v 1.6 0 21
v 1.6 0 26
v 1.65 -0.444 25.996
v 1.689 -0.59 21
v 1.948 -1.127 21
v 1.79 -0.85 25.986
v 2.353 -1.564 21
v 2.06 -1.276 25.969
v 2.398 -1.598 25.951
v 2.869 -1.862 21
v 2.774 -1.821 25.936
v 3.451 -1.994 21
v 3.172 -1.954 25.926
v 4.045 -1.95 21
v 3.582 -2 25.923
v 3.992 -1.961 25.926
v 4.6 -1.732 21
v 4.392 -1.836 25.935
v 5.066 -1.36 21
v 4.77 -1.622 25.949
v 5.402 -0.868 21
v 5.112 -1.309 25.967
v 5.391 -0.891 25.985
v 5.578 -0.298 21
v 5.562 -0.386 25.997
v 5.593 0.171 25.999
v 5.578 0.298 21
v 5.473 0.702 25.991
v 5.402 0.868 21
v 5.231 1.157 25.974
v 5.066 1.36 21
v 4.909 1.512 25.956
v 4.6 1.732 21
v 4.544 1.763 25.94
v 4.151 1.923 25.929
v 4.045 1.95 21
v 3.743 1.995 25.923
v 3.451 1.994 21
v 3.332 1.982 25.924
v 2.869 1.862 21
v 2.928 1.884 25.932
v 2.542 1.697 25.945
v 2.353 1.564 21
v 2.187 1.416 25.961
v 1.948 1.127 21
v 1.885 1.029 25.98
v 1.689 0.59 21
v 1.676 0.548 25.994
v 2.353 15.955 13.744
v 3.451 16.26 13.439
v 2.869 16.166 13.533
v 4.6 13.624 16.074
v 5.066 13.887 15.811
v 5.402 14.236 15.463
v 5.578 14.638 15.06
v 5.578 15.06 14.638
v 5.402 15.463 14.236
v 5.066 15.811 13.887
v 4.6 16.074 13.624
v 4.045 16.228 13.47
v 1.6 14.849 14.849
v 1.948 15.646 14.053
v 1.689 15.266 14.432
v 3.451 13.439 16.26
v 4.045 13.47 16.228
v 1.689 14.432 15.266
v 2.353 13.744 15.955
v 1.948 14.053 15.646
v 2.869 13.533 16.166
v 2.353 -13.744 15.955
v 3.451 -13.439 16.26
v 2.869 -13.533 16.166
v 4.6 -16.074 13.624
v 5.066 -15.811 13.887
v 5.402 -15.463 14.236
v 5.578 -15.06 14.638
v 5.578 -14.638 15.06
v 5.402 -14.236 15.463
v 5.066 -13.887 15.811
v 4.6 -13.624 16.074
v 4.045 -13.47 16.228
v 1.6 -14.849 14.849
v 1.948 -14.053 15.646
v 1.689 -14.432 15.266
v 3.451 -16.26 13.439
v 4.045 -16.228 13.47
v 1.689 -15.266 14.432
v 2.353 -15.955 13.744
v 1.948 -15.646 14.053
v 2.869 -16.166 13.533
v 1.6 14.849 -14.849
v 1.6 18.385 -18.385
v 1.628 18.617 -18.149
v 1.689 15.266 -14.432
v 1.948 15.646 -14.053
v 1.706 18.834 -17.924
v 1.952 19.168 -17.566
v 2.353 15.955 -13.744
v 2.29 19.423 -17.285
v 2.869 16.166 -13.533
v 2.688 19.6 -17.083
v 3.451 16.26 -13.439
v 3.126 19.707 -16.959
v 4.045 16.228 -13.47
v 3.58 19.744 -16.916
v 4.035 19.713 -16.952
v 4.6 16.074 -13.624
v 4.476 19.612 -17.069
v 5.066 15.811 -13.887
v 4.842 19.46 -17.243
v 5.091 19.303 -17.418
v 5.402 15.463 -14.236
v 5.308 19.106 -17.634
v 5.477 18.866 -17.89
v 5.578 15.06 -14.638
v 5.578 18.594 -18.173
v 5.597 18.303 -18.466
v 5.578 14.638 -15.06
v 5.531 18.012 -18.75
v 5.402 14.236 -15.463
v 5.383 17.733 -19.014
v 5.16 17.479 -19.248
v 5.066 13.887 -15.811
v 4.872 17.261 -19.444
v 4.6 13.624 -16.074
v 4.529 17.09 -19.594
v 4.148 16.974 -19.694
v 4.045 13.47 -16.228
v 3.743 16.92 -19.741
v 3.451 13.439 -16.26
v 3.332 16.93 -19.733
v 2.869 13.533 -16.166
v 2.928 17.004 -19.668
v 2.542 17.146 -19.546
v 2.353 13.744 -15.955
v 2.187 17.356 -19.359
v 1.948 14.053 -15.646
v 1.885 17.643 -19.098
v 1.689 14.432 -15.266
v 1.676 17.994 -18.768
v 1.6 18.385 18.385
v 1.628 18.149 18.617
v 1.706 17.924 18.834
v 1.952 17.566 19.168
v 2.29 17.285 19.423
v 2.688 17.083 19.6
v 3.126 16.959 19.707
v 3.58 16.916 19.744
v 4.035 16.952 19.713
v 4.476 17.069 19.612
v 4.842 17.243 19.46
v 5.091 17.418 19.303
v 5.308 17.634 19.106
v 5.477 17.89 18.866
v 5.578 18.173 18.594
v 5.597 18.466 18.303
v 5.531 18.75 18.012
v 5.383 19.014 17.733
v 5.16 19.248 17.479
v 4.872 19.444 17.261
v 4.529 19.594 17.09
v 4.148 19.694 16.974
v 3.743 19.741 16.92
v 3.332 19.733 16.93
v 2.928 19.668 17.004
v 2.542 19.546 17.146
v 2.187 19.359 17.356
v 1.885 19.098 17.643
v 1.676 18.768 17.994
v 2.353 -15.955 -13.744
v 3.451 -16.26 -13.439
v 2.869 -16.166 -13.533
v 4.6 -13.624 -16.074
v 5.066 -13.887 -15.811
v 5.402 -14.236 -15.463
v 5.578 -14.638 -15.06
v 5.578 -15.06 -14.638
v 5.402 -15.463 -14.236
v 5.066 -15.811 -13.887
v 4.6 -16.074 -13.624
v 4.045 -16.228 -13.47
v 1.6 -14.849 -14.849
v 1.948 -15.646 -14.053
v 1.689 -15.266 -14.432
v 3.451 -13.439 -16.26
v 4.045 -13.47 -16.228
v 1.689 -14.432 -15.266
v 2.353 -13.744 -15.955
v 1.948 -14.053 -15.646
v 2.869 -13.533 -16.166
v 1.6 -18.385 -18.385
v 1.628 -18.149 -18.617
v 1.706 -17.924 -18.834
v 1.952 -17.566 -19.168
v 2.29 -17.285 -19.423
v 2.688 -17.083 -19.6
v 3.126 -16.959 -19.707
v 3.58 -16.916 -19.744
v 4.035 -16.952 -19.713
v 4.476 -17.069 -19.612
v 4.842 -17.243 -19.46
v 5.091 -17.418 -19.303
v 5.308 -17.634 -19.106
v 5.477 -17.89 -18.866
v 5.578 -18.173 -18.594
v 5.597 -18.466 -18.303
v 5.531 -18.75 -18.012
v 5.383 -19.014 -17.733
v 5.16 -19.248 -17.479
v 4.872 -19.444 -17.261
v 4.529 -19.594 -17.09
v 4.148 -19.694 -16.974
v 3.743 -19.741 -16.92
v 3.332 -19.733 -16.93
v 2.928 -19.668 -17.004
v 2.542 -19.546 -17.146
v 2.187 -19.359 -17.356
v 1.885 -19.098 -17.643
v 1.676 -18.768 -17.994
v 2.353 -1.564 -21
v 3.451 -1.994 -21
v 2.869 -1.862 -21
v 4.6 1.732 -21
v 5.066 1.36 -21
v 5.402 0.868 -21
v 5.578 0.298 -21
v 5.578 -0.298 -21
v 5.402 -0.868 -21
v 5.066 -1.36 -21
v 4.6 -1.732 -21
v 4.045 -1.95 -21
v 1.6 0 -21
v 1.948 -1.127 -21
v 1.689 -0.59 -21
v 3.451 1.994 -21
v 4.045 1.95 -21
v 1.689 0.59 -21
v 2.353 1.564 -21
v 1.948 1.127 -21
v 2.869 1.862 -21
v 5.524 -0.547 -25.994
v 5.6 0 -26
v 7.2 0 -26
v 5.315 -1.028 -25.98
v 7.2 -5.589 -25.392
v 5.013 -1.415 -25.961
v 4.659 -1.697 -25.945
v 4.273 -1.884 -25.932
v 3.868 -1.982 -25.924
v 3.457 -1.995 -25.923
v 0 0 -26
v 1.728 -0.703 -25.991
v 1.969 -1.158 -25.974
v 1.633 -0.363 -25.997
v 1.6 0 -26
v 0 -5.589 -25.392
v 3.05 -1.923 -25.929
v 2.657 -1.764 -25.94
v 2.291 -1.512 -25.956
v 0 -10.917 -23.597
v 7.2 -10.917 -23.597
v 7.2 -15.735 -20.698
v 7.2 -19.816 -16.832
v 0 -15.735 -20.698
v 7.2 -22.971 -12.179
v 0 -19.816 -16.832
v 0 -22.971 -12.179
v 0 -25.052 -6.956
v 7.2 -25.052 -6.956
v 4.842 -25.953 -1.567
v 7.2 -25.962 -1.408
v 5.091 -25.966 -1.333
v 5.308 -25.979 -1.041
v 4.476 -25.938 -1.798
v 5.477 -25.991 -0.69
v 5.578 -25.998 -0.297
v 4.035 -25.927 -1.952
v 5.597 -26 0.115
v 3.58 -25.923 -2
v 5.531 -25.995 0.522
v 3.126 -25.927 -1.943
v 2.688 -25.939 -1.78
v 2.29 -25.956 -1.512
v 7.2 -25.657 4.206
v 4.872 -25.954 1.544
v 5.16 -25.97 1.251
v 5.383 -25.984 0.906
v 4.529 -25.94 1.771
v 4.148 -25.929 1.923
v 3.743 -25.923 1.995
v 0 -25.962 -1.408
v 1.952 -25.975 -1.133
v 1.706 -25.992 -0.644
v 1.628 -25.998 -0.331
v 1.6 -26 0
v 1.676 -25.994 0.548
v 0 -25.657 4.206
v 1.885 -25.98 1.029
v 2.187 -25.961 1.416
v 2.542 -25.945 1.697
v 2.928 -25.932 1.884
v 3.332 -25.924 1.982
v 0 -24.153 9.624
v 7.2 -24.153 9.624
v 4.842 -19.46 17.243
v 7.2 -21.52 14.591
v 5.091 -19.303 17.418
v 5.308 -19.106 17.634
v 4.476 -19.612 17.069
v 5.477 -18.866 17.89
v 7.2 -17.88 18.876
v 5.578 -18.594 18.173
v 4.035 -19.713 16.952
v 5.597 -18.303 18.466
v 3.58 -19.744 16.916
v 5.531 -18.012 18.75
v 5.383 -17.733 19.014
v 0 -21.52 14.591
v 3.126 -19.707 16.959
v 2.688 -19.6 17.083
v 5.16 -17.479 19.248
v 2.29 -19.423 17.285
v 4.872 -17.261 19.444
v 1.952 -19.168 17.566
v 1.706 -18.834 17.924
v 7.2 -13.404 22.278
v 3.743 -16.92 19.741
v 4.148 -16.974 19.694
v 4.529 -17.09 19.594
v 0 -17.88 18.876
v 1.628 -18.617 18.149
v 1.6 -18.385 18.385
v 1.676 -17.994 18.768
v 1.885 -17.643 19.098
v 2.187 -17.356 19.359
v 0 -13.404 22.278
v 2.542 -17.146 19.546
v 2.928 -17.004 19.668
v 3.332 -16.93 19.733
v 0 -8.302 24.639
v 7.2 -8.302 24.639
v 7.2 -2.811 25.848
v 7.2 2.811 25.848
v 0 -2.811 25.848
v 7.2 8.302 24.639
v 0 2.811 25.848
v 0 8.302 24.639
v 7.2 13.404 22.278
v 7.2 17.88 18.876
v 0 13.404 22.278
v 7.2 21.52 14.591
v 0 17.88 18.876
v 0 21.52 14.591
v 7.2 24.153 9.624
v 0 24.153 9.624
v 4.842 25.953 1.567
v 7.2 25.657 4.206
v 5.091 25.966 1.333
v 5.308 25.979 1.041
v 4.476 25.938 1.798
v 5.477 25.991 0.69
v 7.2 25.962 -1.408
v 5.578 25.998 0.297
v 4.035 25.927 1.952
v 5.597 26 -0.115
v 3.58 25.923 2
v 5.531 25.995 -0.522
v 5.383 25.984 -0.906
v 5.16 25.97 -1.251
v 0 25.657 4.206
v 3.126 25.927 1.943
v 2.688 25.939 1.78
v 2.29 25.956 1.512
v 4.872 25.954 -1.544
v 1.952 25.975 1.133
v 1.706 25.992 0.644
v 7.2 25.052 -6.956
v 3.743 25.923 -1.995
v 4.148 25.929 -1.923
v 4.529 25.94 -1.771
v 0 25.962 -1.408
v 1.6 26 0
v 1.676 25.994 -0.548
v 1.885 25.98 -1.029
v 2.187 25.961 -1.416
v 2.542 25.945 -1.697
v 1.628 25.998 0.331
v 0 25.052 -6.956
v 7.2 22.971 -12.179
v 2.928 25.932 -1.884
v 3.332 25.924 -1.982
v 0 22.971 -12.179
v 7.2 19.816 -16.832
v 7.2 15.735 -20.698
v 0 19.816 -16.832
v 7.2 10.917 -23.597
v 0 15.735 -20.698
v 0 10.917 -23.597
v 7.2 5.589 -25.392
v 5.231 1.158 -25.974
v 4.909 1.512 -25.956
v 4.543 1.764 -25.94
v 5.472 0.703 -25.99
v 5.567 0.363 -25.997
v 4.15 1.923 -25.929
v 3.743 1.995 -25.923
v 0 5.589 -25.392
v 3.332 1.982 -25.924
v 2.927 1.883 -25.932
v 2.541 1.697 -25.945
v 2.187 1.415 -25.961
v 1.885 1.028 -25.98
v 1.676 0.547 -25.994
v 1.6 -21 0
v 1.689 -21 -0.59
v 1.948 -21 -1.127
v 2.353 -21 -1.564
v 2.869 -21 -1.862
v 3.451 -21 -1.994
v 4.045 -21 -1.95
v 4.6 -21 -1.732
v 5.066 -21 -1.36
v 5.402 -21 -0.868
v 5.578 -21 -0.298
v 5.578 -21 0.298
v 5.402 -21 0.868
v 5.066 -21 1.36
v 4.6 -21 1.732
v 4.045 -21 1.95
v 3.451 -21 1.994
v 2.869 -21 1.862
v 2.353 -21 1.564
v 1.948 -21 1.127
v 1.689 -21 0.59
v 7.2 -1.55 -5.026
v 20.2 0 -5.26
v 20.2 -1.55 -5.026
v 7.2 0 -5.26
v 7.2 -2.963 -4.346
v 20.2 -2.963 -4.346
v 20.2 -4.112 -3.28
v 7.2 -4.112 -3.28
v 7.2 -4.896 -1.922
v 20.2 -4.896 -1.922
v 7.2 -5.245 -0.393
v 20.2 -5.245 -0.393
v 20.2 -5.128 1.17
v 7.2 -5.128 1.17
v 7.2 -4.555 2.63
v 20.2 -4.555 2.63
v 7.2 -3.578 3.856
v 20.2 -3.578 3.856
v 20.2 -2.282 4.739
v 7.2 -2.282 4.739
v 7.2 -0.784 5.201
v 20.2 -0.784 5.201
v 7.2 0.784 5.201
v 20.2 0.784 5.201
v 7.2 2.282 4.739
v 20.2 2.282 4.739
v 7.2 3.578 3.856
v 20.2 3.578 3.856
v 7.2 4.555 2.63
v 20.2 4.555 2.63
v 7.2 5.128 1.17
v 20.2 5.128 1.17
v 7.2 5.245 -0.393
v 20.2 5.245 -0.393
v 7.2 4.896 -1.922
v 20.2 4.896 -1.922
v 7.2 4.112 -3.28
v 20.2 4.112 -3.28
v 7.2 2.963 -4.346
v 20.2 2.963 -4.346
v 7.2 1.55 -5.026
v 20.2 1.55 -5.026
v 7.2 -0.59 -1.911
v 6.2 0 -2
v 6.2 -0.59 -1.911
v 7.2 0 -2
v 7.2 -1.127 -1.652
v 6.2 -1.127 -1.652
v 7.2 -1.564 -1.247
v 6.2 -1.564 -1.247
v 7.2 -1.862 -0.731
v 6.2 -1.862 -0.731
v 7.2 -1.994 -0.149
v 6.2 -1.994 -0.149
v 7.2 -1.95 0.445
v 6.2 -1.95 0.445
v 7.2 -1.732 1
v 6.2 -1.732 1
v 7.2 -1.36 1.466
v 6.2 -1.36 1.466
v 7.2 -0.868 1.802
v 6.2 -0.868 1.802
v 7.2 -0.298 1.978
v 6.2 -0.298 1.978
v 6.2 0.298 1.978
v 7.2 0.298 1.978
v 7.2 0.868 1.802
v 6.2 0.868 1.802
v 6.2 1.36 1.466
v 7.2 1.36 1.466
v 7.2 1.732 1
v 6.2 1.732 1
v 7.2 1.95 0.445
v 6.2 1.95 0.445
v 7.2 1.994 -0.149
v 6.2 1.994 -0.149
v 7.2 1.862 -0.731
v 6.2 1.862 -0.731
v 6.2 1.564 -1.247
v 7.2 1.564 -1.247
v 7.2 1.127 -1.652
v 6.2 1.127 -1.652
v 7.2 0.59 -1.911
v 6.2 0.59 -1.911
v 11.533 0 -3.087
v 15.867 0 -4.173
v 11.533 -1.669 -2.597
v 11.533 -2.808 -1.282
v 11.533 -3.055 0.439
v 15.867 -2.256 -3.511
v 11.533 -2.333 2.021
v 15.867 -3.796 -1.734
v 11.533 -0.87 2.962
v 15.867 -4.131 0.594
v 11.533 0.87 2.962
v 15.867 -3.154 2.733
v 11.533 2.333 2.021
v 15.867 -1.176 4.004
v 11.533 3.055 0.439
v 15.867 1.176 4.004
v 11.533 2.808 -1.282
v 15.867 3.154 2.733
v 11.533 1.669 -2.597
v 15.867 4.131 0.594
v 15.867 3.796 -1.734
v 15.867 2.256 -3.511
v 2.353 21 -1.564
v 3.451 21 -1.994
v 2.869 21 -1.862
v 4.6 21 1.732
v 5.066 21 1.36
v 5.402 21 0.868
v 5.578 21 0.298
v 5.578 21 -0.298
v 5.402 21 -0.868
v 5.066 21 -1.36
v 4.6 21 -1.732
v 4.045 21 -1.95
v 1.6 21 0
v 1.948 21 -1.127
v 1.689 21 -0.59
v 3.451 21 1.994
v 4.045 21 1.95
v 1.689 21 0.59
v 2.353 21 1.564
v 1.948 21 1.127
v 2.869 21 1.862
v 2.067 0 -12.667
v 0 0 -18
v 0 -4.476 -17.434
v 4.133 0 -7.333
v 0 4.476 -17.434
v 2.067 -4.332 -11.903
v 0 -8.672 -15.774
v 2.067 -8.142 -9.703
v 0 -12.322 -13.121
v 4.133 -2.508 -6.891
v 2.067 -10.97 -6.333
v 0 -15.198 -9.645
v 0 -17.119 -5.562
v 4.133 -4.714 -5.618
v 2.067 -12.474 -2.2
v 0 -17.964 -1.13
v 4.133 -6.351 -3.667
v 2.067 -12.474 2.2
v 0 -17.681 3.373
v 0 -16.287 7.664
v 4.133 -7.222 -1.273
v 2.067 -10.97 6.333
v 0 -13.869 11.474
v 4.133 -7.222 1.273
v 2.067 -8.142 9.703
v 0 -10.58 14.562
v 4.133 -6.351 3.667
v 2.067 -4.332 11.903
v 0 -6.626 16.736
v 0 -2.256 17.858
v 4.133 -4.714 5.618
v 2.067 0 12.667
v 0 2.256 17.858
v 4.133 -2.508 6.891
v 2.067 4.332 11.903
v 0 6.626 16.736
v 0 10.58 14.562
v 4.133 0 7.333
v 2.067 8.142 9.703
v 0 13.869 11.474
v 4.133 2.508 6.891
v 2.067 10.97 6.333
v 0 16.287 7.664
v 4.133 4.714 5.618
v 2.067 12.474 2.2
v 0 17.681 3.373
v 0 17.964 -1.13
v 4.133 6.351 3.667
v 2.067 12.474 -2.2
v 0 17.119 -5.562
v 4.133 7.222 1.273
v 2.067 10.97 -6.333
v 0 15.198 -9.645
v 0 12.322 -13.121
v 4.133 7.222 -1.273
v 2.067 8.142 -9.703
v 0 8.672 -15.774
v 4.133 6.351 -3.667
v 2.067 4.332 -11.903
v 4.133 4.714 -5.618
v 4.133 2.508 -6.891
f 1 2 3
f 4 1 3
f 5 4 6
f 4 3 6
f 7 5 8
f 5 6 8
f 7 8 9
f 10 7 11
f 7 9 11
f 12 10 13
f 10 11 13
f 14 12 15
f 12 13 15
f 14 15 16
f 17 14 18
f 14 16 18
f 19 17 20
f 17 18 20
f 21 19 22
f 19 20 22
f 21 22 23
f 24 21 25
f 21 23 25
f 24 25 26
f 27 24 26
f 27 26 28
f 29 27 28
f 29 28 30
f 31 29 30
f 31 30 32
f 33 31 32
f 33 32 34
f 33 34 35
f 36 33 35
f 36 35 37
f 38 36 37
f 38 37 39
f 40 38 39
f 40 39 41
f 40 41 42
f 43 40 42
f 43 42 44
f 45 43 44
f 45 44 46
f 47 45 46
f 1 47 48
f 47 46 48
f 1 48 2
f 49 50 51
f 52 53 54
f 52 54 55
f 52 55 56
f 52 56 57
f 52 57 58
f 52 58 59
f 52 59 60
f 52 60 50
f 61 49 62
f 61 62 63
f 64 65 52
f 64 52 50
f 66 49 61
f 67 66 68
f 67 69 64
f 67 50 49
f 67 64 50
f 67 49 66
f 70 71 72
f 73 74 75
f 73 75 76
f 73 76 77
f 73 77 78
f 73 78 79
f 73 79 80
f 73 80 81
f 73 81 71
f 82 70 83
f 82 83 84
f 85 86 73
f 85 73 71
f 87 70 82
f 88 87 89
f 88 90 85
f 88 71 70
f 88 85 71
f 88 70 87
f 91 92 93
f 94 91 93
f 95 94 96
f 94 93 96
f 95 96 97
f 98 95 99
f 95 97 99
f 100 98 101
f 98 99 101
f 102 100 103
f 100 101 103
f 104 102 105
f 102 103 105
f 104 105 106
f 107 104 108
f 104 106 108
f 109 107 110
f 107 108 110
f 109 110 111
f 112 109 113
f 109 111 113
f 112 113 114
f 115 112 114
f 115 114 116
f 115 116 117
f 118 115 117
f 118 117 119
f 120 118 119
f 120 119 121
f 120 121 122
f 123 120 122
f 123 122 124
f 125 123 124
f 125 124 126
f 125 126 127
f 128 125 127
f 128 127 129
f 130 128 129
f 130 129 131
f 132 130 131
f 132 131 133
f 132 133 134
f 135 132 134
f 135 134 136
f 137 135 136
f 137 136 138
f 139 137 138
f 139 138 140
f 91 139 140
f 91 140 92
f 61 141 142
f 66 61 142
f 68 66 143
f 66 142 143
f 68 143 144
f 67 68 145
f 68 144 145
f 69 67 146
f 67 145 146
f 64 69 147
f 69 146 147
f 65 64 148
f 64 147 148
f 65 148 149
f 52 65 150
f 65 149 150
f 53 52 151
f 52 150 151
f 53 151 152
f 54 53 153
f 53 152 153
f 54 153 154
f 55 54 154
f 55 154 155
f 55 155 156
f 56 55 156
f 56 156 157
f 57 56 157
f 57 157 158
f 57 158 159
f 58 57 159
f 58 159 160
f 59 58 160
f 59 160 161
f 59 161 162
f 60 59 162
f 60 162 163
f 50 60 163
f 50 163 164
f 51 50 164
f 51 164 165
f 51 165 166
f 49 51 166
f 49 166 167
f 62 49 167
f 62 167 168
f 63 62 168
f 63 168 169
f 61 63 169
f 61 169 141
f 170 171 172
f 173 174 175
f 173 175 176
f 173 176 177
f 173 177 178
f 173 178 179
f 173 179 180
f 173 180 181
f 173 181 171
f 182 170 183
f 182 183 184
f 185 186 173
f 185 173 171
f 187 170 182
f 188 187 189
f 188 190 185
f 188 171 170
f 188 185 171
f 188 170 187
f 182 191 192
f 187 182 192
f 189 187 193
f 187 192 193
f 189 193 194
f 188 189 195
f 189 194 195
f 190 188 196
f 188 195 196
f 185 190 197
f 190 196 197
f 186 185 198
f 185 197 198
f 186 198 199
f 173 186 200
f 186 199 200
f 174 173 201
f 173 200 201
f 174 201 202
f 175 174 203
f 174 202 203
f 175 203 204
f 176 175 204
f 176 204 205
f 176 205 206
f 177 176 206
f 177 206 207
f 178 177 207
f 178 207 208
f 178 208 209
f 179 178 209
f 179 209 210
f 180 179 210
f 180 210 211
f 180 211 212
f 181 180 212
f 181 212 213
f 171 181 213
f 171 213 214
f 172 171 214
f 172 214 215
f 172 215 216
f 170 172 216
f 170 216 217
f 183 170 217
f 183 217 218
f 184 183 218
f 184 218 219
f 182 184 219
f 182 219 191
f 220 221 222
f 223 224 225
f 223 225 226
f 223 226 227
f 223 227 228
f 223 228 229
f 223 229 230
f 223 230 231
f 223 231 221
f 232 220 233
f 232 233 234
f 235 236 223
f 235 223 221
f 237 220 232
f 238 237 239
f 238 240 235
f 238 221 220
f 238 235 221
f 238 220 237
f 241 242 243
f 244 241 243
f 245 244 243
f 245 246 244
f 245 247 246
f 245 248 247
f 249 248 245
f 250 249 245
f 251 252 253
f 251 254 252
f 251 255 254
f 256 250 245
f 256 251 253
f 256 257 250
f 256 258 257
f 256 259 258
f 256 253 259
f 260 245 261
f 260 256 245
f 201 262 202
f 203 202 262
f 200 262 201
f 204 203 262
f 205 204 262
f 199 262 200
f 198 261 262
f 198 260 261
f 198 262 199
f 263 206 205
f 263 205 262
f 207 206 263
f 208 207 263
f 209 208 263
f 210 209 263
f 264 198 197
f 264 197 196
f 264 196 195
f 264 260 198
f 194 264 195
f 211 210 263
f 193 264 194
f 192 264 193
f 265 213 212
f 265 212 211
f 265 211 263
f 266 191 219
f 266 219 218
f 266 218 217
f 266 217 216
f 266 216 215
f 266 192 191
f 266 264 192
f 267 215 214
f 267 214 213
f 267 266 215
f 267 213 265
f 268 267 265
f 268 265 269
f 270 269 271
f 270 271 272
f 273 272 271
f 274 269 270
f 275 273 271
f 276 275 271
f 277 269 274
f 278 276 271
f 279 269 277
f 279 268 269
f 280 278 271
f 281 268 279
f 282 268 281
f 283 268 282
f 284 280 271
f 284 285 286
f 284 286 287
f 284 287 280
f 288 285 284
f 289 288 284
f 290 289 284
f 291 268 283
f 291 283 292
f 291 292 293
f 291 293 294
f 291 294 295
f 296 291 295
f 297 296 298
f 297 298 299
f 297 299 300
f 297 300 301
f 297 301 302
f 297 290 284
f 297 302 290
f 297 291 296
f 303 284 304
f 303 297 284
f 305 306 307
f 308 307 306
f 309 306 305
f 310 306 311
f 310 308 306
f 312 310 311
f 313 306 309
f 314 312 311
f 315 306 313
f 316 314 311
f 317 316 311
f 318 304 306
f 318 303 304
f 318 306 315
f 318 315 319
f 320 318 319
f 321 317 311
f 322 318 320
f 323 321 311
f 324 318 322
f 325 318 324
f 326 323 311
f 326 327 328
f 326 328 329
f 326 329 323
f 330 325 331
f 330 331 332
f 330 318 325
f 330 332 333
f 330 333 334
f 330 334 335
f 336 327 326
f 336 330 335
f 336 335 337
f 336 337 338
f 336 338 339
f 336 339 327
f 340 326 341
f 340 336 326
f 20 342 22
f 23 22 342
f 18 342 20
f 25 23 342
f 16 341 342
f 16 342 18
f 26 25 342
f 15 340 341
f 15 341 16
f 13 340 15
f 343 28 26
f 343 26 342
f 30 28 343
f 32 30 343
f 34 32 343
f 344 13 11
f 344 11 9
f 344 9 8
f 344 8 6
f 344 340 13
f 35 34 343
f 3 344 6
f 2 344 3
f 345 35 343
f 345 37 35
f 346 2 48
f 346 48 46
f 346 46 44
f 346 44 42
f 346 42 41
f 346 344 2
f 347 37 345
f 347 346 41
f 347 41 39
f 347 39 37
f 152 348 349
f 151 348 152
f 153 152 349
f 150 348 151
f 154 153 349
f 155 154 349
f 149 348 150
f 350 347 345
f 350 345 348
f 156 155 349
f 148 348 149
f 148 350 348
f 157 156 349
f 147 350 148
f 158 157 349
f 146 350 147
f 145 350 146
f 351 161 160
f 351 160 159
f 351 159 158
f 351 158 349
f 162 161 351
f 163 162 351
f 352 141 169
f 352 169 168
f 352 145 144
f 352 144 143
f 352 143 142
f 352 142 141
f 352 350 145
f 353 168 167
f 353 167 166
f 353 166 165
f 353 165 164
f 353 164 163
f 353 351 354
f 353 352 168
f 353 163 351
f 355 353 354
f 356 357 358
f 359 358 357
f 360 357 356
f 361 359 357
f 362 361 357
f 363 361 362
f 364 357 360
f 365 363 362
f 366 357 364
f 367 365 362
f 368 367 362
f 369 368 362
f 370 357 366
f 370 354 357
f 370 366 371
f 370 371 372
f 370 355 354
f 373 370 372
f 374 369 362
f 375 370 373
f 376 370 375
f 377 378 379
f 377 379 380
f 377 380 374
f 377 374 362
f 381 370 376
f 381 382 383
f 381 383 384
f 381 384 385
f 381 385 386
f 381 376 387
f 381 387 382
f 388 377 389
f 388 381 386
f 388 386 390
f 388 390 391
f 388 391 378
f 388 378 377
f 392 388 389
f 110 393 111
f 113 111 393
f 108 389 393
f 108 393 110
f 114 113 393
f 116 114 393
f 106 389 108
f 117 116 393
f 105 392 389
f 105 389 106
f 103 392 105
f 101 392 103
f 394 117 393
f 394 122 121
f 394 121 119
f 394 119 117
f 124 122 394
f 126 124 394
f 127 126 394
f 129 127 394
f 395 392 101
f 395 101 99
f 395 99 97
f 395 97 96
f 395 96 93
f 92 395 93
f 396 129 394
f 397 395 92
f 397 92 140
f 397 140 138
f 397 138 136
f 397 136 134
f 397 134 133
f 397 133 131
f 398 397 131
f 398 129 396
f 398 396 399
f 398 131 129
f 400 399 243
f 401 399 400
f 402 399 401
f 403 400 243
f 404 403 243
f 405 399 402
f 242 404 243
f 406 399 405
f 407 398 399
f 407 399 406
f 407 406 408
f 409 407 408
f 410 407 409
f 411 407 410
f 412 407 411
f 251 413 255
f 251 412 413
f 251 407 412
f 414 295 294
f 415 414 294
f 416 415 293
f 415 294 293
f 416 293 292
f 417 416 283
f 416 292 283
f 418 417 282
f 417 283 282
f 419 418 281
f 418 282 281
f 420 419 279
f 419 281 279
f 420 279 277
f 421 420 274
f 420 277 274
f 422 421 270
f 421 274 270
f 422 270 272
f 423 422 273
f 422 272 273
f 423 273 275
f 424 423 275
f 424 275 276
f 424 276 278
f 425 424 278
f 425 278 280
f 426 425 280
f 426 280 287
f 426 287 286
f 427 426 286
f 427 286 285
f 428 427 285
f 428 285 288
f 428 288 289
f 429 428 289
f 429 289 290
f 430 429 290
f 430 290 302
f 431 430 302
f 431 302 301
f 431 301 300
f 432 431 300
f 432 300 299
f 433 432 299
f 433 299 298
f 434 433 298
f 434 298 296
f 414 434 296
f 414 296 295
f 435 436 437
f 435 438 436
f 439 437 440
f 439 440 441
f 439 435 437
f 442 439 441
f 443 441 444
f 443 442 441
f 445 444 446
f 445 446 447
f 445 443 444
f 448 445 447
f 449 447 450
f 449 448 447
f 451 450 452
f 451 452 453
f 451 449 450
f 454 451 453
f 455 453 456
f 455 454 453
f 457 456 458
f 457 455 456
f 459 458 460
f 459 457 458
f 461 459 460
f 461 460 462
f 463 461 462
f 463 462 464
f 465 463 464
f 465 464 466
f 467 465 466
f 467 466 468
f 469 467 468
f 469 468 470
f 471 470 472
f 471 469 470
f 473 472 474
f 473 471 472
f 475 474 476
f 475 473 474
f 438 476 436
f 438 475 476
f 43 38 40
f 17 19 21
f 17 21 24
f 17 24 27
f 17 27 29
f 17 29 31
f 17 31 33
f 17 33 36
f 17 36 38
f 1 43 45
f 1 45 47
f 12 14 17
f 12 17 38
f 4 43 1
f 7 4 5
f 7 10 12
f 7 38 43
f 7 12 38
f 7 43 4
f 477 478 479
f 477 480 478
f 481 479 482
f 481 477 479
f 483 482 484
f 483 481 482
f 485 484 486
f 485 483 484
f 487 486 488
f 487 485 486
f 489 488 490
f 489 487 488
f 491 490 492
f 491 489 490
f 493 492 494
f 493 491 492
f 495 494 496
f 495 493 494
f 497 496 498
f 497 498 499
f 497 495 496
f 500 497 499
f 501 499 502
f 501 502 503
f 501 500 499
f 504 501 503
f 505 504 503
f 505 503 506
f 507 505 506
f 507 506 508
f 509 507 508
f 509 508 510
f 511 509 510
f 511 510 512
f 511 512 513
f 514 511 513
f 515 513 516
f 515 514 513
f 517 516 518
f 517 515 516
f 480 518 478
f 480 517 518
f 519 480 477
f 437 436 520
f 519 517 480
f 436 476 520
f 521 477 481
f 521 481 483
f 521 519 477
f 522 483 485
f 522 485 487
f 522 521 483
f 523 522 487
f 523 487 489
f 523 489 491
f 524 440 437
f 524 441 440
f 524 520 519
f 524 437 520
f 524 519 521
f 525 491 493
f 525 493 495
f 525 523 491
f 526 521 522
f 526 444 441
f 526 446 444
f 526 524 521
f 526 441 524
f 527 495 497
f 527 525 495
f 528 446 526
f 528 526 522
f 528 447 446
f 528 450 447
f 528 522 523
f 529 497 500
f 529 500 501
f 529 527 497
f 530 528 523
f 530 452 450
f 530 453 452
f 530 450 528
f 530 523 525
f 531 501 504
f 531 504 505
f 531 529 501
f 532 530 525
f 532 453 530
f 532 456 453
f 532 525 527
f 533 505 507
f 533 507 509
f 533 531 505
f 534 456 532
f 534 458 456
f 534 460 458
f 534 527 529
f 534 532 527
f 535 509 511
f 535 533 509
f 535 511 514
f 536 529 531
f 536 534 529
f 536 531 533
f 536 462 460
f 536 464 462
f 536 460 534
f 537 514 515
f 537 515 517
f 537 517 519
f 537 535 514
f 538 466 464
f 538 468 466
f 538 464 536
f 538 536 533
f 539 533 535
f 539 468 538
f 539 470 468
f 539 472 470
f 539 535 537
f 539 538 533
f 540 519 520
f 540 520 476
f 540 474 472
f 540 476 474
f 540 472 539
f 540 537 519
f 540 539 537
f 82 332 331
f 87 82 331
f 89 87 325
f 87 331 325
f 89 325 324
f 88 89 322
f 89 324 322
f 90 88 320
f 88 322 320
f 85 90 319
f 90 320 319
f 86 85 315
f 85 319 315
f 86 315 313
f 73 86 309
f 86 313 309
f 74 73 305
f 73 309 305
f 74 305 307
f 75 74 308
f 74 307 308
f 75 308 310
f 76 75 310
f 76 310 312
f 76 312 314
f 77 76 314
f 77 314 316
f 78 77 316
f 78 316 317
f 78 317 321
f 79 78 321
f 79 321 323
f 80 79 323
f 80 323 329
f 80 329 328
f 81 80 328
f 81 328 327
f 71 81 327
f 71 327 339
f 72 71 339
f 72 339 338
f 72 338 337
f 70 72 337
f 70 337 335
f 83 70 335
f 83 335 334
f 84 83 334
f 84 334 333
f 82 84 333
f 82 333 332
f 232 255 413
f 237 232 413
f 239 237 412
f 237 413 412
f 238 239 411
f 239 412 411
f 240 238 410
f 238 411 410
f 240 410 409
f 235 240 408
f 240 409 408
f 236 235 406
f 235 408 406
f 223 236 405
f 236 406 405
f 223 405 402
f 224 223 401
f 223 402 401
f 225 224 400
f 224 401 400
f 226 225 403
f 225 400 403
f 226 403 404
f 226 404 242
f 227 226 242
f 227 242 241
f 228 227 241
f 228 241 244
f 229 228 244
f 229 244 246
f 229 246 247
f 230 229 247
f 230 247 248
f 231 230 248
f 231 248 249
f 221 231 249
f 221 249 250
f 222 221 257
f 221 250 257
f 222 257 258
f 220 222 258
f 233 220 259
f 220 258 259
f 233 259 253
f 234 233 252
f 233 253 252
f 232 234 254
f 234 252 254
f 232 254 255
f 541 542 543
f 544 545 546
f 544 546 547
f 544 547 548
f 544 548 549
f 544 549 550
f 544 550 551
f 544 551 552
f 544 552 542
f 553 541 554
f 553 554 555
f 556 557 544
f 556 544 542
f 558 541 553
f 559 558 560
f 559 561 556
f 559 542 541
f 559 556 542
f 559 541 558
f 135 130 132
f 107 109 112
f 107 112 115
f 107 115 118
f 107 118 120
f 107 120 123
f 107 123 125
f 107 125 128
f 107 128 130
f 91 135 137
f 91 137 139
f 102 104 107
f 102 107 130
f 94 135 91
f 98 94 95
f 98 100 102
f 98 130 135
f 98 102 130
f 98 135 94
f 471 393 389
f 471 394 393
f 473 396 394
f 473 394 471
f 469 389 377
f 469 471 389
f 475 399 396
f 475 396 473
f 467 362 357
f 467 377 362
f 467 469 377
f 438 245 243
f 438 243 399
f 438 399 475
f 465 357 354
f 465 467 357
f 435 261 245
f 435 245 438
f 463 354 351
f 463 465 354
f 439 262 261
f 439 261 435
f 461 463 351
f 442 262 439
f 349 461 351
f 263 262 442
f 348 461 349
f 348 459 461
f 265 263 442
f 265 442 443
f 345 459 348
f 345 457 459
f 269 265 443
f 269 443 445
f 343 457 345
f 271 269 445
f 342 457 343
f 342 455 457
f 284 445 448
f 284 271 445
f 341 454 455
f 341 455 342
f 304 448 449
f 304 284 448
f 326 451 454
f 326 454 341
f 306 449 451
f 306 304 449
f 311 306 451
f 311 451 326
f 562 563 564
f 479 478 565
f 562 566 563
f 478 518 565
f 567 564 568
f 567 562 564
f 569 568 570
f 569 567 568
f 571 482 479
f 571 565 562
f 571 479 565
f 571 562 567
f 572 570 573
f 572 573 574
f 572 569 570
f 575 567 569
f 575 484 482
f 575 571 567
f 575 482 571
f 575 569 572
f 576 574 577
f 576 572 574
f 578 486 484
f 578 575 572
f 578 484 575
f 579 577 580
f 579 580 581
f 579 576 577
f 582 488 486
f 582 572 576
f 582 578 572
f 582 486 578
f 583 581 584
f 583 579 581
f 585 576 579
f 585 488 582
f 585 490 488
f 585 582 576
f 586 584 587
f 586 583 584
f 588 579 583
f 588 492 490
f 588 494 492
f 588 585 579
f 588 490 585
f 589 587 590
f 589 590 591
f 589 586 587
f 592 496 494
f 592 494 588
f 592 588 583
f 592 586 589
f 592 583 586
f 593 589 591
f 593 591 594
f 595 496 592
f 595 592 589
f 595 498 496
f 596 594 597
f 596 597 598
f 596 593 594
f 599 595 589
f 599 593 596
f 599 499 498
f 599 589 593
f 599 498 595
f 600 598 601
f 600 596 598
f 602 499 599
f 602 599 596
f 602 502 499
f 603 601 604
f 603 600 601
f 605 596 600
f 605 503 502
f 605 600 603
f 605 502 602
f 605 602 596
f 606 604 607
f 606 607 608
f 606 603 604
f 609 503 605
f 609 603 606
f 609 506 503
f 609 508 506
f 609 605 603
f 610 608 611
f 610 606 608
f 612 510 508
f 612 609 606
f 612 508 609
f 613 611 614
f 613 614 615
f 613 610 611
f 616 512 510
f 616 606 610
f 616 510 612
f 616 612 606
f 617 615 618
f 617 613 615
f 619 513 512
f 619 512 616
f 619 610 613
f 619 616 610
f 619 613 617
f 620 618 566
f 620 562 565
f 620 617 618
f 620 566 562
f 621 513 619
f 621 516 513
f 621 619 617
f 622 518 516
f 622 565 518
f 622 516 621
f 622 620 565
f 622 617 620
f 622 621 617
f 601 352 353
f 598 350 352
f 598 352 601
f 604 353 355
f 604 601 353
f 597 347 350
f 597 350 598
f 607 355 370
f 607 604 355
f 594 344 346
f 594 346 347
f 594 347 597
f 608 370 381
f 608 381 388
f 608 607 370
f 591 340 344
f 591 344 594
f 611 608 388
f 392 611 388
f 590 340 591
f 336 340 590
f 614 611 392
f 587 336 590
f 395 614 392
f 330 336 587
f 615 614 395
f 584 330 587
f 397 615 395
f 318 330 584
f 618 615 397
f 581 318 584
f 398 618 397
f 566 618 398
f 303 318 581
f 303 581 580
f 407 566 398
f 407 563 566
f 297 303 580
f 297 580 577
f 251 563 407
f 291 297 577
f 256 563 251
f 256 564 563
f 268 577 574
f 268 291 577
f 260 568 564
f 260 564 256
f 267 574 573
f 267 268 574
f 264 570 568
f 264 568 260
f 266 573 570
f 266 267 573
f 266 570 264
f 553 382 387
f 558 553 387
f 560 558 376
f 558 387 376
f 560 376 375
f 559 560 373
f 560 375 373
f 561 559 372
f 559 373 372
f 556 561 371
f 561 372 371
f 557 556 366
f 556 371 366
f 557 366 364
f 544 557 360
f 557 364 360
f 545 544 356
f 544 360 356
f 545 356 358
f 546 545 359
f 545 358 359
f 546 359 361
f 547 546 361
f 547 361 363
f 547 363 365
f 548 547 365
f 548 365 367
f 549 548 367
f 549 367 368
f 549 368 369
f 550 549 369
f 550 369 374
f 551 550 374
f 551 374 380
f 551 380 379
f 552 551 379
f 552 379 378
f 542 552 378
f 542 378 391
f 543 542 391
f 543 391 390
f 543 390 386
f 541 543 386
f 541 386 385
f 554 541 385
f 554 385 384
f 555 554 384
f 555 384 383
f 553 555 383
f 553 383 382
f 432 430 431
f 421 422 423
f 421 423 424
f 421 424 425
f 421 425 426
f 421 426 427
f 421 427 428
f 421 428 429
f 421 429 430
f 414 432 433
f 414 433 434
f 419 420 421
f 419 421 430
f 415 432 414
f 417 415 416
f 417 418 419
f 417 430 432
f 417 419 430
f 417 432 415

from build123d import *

# Parameters (mm, degrees)
SKETCH2_R          = 2
CUT_EXTRUDE1_DEPTH = 5
CIRPATTERN1_COUNT  = 8


with BuildPart() as part:
    # Sketch1 → Revolve2 (revolve)
    with BuildSketch(Plane.XY, mode=Mode.PRIVATE) as revolve2_sk:
        Polygon((7.2, 26), (0, 26), (0, 18), (6.2, 2), (7.2, 2), (20.2, 5.26), (7.2, 5.26), align=None)
    revolve(revolve2_sk.sketch.rotate(Axis((20.2, 0, 0), (-1, 0, 0)), 90), axis=Axis((20.2, 0, 0), (-1, 0, 0)))

    # Sketch2 → Cut-Extrude1 (cut)
    with BuildSketch(Plane(origin=(0, 0, -26), x_dir=(-1, 0, 0), z_dir=(0, 0, -1))):
        with Locations((-3.6, 0)):
            Circle(SKETCH2_R)
    cut_extrude1 = extrude(amount=-CUT_EXTRUDE1_DEPTH, mode=Mode.SUBTRACT)

    # CirPattern1: Cut-Extrude1 ×8 about axis
    cirpattern1_axis = Axis((0, 0, 0), (1, 0, 0))
    for i in range(1, CIRPATTERN1_COUNT):
        add(cut_extrude1.rotate(cirpattern1_axis, i * 360 / CIRPATTERN1_COUNT), mode=Mode.SUBTRACT)


solid = part.part
